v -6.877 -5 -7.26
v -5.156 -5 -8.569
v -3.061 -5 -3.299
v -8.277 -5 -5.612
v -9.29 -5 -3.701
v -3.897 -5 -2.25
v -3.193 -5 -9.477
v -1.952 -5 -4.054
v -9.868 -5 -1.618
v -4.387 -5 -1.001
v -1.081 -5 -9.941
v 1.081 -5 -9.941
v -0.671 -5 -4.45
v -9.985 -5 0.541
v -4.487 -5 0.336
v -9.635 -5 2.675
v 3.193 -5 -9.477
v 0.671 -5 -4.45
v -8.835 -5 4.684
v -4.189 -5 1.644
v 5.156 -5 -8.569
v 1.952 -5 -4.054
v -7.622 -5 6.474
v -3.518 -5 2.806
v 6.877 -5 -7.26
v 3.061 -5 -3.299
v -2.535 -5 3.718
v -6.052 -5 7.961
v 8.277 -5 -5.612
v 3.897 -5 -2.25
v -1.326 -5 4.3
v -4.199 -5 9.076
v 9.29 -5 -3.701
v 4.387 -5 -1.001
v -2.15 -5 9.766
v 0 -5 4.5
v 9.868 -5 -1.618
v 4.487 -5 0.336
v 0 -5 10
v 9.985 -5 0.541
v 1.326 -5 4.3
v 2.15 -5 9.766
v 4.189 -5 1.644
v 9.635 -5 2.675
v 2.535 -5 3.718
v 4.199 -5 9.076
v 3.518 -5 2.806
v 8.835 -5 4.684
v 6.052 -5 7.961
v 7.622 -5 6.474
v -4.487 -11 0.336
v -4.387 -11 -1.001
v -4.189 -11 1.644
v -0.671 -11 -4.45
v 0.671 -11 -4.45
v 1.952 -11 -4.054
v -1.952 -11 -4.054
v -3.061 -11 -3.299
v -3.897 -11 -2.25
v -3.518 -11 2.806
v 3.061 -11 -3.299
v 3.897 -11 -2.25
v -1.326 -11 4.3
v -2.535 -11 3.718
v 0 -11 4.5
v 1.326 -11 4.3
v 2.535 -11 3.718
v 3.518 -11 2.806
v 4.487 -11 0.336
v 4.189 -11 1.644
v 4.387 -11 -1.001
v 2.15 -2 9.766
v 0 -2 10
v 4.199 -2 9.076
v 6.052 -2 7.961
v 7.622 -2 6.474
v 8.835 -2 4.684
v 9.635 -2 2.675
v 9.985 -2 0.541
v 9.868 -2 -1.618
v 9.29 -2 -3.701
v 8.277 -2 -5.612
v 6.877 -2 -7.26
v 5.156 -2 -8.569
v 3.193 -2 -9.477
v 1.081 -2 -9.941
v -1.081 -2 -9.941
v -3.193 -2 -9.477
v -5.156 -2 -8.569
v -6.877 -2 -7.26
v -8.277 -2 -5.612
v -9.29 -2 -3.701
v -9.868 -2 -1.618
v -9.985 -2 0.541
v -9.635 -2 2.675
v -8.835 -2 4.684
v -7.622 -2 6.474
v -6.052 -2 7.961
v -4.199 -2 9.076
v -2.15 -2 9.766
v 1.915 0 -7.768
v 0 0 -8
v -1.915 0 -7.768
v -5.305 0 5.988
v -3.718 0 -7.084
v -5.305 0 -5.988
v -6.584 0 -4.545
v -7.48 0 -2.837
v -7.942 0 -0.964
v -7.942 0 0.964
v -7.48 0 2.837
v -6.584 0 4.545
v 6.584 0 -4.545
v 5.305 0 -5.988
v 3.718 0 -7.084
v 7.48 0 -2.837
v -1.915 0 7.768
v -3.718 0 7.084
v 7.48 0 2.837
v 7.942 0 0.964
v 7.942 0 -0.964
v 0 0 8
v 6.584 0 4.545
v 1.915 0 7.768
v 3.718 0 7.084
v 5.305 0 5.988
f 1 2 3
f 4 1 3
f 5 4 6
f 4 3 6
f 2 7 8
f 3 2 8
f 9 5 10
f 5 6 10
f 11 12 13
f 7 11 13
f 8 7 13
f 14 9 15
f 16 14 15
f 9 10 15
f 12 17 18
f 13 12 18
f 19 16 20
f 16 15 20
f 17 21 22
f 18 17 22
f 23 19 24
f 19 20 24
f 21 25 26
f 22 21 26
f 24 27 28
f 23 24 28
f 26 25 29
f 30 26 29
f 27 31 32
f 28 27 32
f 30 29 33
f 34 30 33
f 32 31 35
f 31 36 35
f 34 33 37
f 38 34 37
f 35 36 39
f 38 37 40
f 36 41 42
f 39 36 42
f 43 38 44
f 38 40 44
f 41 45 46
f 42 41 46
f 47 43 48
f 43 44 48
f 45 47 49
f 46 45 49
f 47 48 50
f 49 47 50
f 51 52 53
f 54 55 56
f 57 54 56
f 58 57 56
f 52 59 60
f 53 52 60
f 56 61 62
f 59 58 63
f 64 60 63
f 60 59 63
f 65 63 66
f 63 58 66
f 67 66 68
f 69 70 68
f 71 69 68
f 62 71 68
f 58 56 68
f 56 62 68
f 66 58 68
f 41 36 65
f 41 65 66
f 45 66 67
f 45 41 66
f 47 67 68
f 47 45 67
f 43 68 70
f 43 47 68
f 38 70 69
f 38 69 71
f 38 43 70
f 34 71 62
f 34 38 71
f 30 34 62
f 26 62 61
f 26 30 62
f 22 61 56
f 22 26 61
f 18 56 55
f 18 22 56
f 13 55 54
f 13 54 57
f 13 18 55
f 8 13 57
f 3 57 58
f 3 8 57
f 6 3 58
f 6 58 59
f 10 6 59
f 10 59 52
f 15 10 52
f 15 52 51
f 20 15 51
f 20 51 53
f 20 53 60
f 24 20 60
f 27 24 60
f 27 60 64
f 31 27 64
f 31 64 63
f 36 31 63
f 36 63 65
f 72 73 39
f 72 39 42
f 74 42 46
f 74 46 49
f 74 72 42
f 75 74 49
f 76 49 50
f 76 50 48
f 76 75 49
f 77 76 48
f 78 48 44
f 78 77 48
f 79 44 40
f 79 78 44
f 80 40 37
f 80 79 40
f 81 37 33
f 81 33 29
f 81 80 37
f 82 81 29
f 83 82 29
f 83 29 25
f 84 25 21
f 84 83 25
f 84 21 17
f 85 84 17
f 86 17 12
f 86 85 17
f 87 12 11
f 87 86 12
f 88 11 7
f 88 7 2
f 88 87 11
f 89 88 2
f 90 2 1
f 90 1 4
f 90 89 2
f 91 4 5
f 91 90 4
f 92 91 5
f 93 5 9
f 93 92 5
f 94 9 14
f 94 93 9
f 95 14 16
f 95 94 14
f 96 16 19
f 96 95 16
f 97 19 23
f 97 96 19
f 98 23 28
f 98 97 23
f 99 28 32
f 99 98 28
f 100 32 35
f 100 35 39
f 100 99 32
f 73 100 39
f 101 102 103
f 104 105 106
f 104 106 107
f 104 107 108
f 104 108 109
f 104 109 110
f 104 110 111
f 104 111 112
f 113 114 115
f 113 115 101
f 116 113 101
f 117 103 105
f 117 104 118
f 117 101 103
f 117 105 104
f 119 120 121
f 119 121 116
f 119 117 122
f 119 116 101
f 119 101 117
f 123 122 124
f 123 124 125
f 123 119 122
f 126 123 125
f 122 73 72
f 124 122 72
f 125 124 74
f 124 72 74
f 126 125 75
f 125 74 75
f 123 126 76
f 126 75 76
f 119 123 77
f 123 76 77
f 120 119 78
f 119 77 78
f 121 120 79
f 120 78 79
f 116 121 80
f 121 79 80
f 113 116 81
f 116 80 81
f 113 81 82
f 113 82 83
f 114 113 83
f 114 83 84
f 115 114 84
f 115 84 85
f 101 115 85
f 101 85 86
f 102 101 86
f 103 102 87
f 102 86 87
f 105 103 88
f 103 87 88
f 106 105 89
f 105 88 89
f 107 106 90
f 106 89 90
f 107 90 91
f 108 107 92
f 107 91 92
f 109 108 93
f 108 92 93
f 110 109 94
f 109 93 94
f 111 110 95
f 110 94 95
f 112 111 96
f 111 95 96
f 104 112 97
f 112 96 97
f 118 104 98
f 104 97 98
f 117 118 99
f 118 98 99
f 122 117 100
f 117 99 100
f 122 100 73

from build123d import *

# Parameters (mm, degrees)
SKETCH_2_R      = 10
EXTRUDE_1_DEPTH = 5
SKETCH_3_R      = 4.5
EXTRUDE_2_DEPTH = 11
CHAMFER_1_SIZE  = 2


with BuildPart() as part:
    # 草圖2 → 填料-伸長1 (new body)
    with BuildSketch(Plane(origin=(0, 0, 0), x_dir=(1, 0, 0), z_dir=(0, 1, 0))):
        with Locations(Location((0, 0, 0), (0, 0, 270))):
            Circle(SKETCH_2_R)
    extrude(amount=-EXTRUDE_1_DEPTH)

    # 草圖3 → 填料-伸長2 (add)
    with BuildSketch(Plane(origin=(0, 0, 0), x_dir=(1, 0, 0), z_dir=(0, 1, 0))):
        with Locations(Location((0, 0, 0), (0, 0, 270))):
            Circle(SKETCH_3_R)
    extrude(amount=-EXTRUDE_2_DEPTH)

    # 導角1
    chamfer_1_edges = [part.edges().sort_by_distance(p)[0] for p in [
        (0, 0, -10),
    ]]
    chamfer(chamfer_1_edges, length=CHAMFER_1_SIZE)


solid = part.part
